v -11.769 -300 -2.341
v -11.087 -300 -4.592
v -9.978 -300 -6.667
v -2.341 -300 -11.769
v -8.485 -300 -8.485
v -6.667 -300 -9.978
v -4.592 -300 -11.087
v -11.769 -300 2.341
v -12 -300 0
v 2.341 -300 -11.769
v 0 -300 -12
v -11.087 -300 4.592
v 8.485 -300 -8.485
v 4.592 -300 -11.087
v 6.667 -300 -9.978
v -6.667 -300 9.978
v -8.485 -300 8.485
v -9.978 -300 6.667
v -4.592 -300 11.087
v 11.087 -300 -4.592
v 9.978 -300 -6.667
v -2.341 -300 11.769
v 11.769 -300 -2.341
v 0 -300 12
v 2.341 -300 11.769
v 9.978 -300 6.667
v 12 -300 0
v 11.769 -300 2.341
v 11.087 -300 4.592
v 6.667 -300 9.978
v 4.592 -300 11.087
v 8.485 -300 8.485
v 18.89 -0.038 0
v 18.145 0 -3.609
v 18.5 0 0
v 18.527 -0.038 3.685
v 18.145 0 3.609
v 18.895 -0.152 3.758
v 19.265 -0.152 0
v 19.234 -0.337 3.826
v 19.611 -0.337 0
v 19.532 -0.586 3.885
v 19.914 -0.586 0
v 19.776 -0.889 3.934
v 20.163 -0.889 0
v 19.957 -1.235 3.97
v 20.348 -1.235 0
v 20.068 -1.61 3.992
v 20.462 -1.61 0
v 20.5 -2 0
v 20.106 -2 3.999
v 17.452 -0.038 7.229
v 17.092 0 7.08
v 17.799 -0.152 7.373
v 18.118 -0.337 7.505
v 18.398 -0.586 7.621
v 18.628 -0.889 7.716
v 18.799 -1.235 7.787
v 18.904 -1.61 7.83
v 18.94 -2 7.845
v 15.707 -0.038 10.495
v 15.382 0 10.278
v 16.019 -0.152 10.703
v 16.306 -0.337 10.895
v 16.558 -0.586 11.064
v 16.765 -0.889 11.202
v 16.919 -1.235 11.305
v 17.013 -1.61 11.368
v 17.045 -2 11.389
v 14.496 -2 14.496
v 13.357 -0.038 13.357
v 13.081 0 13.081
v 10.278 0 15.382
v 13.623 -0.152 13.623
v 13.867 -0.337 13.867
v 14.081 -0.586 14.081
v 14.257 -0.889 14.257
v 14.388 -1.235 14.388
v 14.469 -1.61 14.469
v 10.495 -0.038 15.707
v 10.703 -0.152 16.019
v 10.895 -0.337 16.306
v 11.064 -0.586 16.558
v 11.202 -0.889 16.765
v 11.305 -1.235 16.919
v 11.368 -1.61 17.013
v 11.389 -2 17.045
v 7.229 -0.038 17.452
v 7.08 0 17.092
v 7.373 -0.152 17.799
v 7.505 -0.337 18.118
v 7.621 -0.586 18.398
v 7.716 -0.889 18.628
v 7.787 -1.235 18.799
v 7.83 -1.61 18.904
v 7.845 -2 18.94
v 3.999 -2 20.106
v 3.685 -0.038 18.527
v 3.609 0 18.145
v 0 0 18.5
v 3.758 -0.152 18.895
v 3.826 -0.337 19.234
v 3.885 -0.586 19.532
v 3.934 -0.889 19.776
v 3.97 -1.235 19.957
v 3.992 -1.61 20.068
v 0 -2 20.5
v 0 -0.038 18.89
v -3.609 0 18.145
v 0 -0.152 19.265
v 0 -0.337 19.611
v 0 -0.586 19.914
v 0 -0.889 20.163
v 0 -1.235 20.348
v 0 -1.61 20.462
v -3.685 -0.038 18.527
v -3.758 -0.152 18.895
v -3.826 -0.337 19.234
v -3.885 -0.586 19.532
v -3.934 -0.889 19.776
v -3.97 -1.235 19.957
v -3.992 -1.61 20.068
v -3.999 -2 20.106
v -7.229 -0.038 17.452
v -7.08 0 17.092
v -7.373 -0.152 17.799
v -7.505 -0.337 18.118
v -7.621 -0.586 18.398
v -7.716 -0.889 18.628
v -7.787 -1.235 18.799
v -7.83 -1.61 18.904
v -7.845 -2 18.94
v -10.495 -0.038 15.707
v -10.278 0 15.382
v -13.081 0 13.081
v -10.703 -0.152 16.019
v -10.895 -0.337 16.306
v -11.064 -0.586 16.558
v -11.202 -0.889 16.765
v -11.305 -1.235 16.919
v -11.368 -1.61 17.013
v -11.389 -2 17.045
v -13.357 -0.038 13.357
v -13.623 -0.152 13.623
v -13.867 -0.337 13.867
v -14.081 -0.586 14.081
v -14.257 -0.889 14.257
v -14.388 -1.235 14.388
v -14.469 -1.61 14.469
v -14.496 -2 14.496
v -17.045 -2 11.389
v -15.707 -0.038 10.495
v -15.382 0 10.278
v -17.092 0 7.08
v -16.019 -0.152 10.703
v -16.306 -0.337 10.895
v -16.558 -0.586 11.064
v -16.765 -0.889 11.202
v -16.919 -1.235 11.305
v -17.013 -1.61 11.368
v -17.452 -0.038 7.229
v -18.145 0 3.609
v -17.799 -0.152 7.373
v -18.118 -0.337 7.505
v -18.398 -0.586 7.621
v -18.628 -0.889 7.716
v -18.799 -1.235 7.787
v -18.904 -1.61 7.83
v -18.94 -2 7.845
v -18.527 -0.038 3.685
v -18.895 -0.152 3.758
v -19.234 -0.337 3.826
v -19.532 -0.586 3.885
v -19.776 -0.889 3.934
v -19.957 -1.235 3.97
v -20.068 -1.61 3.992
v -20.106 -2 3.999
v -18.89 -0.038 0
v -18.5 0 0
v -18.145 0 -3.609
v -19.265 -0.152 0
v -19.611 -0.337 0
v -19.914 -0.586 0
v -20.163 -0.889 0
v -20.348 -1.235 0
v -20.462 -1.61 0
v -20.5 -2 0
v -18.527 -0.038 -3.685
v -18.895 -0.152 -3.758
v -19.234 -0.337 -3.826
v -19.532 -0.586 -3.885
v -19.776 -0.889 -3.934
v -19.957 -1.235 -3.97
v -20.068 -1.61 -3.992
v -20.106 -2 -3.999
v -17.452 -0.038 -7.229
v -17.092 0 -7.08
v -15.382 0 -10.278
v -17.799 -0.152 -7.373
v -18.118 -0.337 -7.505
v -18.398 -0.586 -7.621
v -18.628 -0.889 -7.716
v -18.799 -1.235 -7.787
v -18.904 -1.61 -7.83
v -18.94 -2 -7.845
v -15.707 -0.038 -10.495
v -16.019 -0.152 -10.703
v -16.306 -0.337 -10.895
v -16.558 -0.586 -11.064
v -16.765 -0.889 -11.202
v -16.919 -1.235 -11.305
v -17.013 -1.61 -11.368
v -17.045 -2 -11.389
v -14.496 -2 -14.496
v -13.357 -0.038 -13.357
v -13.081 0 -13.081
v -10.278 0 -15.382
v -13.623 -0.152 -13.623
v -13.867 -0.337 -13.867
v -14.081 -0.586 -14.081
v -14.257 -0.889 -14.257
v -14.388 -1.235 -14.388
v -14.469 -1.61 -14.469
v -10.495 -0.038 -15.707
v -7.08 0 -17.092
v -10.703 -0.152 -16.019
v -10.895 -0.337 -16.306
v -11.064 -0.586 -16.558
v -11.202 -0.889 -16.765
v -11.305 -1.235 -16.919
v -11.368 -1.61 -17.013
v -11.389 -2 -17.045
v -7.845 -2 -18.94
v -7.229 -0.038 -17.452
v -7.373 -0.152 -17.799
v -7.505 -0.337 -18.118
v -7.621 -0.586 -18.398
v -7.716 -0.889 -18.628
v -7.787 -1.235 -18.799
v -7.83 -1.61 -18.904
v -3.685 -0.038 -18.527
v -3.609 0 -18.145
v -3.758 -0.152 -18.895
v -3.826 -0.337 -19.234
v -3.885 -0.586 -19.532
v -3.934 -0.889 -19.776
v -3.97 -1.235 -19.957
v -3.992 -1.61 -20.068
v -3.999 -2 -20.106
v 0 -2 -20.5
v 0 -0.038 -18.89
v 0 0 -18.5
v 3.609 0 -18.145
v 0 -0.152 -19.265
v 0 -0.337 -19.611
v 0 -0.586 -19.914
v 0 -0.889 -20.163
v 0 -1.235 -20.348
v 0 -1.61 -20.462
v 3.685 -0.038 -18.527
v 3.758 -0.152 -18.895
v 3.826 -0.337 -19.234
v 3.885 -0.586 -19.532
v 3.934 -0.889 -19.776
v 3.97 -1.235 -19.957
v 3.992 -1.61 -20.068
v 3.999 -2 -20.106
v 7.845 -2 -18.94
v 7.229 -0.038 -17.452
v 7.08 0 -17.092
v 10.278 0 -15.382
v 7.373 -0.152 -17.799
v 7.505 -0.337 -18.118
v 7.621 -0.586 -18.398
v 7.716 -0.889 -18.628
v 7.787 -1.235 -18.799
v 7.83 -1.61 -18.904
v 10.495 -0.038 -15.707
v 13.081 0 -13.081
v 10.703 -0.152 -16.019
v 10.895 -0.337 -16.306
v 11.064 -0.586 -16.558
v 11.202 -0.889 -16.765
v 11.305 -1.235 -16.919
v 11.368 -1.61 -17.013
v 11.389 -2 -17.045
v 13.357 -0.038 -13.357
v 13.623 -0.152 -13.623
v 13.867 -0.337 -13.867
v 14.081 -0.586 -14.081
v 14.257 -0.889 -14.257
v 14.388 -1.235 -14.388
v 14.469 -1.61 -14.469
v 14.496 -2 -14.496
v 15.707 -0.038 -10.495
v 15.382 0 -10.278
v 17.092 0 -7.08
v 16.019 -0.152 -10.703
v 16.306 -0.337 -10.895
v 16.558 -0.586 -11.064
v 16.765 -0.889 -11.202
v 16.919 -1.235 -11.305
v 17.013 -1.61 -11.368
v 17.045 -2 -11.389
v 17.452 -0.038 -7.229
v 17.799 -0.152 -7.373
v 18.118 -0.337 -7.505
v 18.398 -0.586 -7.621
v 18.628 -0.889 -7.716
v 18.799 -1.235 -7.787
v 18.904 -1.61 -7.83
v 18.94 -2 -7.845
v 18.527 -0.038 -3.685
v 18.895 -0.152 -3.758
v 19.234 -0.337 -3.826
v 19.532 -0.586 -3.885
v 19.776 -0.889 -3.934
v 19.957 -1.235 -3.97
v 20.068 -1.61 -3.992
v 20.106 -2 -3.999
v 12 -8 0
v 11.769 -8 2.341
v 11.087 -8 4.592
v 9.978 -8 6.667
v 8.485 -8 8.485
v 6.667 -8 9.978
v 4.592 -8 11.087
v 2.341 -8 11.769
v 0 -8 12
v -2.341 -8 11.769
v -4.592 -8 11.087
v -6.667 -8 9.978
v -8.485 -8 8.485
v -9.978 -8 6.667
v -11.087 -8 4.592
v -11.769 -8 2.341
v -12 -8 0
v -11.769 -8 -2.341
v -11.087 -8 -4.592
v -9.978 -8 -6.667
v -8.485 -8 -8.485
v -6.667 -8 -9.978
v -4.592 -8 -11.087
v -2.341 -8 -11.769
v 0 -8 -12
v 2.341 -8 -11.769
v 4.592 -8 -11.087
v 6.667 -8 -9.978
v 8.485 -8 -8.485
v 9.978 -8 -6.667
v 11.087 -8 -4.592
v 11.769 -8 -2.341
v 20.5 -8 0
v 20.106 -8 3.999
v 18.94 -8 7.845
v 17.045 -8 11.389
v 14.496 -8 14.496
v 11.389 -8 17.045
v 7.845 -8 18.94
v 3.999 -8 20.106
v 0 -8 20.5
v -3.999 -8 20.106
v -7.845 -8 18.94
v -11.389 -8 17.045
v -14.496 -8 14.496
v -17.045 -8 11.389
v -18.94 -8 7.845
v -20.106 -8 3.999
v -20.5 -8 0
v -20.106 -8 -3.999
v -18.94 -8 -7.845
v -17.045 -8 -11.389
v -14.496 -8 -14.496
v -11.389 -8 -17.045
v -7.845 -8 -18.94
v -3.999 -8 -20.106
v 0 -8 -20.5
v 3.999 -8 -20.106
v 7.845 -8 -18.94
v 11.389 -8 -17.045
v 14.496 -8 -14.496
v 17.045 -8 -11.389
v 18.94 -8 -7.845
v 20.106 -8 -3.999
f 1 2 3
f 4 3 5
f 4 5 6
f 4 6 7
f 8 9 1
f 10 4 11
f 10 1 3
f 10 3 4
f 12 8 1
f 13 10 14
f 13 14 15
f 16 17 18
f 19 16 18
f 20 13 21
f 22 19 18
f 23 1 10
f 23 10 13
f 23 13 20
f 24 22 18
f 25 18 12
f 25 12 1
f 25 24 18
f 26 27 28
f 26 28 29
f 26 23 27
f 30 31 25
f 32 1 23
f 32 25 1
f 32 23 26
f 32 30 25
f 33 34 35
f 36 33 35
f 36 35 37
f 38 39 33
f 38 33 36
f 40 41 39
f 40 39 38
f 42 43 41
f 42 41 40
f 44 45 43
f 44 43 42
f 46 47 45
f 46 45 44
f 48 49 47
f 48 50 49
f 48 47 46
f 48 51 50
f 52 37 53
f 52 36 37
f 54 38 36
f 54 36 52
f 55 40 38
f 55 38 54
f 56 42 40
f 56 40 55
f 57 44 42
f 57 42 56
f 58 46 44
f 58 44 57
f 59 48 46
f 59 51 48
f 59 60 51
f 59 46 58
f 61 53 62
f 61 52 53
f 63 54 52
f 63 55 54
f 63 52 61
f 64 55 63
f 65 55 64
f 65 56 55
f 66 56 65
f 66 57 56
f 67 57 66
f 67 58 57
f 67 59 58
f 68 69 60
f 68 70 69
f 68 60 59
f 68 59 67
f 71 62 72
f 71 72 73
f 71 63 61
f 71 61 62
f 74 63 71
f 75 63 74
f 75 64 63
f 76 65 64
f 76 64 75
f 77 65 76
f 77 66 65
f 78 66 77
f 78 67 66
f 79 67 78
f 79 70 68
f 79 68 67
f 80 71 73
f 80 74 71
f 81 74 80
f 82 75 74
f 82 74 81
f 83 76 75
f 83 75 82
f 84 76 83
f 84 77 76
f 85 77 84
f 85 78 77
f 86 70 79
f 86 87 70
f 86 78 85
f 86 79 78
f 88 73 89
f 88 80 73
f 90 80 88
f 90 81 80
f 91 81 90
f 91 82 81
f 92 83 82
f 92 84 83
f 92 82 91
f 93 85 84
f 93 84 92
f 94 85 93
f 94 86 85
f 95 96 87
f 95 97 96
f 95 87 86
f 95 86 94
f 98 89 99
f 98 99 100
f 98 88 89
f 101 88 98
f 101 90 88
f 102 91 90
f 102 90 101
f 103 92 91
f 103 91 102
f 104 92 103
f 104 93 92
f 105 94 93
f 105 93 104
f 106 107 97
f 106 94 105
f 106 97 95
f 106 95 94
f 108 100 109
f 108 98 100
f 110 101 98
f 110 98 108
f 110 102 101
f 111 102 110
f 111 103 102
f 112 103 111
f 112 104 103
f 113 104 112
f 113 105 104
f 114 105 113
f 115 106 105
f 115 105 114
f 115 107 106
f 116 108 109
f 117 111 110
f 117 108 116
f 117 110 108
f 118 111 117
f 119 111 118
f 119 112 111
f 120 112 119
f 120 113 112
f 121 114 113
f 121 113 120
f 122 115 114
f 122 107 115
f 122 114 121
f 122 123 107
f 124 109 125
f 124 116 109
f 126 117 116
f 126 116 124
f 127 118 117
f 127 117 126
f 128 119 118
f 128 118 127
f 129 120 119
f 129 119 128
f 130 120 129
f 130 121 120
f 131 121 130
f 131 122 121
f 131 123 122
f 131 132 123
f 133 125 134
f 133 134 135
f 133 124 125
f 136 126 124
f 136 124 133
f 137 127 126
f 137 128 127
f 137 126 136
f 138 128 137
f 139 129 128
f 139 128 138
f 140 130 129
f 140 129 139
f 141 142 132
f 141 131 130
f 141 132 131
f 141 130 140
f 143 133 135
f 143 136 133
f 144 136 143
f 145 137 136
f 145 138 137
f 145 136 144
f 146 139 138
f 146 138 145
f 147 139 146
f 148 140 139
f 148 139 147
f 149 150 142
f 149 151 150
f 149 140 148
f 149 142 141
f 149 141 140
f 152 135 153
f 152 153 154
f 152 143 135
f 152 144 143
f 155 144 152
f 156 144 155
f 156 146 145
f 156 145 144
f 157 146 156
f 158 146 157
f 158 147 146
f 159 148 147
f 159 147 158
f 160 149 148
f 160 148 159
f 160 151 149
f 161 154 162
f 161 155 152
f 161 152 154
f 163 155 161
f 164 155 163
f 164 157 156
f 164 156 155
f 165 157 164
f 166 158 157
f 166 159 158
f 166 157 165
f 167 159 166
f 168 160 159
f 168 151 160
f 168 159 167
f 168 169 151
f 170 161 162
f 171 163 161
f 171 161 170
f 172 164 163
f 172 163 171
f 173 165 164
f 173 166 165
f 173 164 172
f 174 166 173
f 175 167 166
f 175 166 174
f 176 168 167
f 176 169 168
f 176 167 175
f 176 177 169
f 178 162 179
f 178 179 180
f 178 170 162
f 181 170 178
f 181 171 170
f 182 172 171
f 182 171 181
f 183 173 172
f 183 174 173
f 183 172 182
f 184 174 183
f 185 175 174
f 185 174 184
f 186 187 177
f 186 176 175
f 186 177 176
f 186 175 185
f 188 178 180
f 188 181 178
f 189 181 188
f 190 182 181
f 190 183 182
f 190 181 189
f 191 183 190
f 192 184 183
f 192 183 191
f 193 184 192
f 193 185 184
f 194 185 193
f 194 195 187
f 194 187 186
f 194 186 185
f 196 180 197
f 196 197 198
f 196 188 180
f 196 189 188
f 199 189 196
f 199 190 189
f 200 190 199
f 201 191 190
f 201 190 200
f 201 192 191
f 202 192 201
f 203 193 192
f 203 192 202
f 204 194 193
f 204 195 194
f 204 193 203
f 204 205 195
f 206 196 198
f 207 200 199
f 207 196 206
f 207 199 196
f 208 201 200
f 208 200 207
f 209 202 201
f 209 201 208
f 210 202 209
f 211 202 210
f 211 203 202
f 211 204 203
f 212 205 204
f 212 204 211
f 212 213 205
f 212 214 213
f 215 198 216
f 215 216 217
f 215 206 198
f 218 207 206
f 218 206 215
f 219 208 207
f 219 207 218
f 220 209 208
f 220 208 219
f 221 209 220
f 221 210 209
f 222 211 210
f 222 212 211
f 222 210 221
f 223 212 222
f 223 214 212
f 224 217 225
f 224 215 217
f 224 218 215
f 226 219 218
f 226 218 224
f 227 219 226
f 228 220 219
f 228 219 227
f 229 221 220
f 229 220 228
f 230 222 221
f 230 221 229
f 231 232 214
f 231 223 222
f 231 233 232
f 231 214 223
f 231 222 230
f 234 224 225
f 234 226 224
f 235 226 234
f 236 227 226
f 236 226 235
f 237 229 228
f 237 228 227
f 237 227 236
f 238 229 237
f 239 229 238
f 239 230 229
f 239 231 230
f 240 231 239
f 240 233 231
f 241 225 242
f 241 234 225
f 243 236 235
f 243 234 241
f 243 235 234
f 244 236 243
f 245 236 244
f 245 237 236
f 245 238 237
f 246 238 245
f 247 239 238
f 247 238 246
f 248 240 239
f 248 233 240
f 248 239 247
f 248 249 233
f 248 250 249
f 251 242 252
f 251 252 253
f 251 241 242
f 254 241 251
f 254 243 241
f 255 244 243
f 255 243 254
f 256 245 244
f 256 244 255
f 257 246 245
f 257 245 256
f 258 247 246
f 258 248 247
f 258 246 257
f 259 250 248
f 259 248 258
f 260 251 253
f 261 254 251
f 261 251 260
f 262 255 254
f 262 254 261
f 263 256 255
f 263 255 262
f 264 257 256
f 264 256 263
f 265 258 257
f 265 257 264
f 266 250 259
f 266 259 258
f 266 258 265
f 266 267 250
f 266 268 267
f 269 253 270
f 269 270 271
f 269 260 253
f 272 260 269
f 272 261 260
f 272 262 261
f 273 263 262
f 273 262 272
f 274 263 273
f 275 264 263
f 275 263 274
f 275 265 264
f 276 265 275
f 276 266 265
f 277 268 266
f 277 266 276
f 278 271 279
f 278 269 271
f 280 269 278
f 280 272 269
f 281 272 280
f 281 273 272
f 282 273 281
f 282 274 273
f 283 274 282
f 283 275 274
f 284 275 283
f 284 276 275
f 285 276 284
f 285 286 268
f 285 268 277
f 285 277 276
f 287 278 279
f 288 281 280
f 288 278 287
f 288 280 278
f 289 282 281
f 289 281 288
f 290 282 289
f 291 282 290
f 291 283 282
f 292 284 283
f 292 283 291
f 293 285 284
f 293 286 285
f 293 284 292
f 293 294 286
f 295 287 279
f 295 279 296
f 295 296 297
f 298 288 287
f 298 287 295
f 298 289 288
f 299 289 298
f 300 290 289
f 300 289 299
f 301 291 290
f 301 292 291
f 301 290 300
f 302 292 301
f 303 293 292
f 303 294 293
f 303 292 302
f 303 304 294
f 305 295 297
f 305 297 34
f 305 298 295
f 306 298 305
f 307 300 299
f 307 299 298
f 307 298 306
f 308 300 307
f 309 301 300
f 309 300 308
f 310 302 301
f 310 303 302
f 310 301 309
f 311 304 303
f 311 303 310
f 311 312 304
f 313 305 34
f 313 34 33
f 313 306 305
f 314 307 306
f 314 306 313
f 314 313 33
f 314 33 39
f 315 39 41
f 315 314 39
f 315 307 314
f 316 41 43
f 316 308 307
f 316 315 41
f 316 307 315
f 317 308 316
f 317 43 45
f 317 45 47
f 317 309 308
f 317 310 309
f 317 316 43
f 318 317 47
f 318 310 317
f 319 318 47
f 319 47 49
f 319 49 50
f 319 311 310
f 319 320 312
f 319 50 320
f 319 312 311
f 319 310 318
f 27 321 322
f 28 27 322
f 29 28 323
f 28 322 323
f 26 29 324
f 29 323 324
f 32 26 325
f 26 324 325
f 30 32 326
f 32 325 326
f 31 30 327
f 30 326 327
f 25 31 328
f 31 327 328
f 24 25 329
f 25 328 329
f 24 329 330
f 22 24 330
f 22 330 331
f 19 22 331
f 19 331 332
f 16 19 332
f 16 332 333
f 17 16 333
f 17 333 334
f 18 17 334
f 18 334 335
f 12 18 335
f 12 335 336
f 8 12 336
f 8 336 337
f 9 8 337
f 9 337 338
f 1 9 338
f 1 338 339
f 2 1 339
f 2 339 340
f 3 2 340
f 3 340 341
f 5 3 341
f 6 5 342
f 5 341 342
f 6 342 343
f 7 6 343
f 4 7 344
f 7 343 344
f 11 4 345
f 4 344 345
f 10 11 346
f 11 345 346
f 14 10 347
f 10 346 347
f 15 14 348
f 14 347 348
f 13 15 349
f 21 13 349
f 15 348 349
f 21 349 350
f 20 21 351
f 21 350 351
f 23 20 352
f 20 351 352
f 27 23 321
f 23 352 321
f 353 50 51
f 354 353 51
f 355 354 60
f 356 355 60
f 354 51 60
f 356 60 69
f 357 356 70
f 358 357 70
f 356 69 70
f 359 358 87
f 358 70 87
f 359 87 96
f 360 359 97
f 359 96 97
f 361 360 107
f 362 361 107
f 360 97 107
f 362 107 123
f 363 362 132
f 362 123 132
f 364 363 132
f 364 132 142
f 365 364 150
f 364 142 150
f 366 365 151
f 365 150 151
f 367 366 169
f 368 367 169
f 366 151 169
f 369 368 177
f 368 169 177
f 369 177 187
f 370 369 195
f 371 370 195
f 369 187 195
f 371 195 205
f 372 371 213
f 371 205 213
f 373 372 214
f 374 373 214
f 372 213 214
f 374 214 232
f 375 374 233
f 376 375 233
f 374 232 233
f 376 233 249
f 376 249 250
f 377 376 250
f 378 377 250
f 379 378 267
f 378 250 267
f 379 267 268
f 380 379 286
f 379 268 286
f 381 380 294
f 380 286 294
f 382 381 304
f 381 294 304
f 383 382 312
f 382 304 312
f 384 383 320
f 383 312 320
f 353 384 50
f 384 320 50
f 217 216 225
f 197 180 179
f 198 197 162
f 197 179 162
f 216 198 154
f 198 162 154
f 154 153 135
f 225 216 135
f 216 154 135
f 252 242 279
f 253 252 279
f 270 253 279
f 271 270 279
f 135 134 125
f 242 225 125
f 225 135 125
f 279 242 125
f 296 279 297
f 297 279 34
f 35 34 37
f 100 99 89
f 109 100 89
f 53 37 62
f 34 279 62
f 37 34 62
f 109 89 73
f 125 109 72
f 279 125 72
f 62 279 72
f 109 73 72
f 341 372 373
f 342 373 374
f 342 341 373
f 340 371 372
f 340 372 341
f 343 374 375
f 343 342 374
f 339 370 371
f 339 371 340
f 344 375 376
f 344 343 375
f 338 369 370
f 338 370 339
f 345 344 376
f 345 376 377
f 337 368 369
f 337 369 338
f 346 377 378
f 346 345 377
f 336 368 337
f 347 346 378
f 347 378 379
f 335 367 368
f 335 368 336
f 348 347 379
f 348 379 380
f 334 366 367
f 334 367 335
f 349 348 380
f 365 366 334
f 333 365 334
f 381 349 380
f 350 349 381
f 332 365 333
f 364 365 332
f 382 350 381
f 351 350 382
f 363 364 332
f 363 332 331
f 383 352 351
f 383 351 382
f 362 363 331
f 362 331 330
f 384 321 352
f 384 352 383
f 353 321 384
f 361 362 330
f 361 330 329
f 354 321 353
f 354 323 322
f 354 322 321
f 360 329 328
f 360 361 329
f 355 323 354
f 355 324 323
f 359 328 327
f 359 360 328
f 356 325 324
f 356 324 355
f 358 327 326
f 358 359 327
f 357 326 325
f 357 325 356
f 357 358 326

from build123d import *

# Parameters (mm, degrees)
F0_R     = 20.5
F0_R_2   = 12
F1_DEPTH = 8
F2_DEPTH = 300
F3_R     = 2


with BuildPart() as f1:
    # F0 (on Front) → F1 (new body)
    with BuildSketch(Plane.XZ):
        Circle(F0_R)
        Circle(F0_R_2, mode=Mode.SUBTRACT)
        Circle(F0_R_2)
    extrude(amount=F1_DEPTH)

    # F0 (on Front) → F2 (join)
    with BuildSketch(Plane.XZ):
        Circle(F0_R_2)
    extrude(amount=F2_DEPTH)

    # F3
    f3_edges = [f1.edges().sort_by_distance(p)[0] for p in [
        (-20.5, 0, 0),
    ]]
    fillet(f3_edges, radius=F3_R)


solid = f1.part
